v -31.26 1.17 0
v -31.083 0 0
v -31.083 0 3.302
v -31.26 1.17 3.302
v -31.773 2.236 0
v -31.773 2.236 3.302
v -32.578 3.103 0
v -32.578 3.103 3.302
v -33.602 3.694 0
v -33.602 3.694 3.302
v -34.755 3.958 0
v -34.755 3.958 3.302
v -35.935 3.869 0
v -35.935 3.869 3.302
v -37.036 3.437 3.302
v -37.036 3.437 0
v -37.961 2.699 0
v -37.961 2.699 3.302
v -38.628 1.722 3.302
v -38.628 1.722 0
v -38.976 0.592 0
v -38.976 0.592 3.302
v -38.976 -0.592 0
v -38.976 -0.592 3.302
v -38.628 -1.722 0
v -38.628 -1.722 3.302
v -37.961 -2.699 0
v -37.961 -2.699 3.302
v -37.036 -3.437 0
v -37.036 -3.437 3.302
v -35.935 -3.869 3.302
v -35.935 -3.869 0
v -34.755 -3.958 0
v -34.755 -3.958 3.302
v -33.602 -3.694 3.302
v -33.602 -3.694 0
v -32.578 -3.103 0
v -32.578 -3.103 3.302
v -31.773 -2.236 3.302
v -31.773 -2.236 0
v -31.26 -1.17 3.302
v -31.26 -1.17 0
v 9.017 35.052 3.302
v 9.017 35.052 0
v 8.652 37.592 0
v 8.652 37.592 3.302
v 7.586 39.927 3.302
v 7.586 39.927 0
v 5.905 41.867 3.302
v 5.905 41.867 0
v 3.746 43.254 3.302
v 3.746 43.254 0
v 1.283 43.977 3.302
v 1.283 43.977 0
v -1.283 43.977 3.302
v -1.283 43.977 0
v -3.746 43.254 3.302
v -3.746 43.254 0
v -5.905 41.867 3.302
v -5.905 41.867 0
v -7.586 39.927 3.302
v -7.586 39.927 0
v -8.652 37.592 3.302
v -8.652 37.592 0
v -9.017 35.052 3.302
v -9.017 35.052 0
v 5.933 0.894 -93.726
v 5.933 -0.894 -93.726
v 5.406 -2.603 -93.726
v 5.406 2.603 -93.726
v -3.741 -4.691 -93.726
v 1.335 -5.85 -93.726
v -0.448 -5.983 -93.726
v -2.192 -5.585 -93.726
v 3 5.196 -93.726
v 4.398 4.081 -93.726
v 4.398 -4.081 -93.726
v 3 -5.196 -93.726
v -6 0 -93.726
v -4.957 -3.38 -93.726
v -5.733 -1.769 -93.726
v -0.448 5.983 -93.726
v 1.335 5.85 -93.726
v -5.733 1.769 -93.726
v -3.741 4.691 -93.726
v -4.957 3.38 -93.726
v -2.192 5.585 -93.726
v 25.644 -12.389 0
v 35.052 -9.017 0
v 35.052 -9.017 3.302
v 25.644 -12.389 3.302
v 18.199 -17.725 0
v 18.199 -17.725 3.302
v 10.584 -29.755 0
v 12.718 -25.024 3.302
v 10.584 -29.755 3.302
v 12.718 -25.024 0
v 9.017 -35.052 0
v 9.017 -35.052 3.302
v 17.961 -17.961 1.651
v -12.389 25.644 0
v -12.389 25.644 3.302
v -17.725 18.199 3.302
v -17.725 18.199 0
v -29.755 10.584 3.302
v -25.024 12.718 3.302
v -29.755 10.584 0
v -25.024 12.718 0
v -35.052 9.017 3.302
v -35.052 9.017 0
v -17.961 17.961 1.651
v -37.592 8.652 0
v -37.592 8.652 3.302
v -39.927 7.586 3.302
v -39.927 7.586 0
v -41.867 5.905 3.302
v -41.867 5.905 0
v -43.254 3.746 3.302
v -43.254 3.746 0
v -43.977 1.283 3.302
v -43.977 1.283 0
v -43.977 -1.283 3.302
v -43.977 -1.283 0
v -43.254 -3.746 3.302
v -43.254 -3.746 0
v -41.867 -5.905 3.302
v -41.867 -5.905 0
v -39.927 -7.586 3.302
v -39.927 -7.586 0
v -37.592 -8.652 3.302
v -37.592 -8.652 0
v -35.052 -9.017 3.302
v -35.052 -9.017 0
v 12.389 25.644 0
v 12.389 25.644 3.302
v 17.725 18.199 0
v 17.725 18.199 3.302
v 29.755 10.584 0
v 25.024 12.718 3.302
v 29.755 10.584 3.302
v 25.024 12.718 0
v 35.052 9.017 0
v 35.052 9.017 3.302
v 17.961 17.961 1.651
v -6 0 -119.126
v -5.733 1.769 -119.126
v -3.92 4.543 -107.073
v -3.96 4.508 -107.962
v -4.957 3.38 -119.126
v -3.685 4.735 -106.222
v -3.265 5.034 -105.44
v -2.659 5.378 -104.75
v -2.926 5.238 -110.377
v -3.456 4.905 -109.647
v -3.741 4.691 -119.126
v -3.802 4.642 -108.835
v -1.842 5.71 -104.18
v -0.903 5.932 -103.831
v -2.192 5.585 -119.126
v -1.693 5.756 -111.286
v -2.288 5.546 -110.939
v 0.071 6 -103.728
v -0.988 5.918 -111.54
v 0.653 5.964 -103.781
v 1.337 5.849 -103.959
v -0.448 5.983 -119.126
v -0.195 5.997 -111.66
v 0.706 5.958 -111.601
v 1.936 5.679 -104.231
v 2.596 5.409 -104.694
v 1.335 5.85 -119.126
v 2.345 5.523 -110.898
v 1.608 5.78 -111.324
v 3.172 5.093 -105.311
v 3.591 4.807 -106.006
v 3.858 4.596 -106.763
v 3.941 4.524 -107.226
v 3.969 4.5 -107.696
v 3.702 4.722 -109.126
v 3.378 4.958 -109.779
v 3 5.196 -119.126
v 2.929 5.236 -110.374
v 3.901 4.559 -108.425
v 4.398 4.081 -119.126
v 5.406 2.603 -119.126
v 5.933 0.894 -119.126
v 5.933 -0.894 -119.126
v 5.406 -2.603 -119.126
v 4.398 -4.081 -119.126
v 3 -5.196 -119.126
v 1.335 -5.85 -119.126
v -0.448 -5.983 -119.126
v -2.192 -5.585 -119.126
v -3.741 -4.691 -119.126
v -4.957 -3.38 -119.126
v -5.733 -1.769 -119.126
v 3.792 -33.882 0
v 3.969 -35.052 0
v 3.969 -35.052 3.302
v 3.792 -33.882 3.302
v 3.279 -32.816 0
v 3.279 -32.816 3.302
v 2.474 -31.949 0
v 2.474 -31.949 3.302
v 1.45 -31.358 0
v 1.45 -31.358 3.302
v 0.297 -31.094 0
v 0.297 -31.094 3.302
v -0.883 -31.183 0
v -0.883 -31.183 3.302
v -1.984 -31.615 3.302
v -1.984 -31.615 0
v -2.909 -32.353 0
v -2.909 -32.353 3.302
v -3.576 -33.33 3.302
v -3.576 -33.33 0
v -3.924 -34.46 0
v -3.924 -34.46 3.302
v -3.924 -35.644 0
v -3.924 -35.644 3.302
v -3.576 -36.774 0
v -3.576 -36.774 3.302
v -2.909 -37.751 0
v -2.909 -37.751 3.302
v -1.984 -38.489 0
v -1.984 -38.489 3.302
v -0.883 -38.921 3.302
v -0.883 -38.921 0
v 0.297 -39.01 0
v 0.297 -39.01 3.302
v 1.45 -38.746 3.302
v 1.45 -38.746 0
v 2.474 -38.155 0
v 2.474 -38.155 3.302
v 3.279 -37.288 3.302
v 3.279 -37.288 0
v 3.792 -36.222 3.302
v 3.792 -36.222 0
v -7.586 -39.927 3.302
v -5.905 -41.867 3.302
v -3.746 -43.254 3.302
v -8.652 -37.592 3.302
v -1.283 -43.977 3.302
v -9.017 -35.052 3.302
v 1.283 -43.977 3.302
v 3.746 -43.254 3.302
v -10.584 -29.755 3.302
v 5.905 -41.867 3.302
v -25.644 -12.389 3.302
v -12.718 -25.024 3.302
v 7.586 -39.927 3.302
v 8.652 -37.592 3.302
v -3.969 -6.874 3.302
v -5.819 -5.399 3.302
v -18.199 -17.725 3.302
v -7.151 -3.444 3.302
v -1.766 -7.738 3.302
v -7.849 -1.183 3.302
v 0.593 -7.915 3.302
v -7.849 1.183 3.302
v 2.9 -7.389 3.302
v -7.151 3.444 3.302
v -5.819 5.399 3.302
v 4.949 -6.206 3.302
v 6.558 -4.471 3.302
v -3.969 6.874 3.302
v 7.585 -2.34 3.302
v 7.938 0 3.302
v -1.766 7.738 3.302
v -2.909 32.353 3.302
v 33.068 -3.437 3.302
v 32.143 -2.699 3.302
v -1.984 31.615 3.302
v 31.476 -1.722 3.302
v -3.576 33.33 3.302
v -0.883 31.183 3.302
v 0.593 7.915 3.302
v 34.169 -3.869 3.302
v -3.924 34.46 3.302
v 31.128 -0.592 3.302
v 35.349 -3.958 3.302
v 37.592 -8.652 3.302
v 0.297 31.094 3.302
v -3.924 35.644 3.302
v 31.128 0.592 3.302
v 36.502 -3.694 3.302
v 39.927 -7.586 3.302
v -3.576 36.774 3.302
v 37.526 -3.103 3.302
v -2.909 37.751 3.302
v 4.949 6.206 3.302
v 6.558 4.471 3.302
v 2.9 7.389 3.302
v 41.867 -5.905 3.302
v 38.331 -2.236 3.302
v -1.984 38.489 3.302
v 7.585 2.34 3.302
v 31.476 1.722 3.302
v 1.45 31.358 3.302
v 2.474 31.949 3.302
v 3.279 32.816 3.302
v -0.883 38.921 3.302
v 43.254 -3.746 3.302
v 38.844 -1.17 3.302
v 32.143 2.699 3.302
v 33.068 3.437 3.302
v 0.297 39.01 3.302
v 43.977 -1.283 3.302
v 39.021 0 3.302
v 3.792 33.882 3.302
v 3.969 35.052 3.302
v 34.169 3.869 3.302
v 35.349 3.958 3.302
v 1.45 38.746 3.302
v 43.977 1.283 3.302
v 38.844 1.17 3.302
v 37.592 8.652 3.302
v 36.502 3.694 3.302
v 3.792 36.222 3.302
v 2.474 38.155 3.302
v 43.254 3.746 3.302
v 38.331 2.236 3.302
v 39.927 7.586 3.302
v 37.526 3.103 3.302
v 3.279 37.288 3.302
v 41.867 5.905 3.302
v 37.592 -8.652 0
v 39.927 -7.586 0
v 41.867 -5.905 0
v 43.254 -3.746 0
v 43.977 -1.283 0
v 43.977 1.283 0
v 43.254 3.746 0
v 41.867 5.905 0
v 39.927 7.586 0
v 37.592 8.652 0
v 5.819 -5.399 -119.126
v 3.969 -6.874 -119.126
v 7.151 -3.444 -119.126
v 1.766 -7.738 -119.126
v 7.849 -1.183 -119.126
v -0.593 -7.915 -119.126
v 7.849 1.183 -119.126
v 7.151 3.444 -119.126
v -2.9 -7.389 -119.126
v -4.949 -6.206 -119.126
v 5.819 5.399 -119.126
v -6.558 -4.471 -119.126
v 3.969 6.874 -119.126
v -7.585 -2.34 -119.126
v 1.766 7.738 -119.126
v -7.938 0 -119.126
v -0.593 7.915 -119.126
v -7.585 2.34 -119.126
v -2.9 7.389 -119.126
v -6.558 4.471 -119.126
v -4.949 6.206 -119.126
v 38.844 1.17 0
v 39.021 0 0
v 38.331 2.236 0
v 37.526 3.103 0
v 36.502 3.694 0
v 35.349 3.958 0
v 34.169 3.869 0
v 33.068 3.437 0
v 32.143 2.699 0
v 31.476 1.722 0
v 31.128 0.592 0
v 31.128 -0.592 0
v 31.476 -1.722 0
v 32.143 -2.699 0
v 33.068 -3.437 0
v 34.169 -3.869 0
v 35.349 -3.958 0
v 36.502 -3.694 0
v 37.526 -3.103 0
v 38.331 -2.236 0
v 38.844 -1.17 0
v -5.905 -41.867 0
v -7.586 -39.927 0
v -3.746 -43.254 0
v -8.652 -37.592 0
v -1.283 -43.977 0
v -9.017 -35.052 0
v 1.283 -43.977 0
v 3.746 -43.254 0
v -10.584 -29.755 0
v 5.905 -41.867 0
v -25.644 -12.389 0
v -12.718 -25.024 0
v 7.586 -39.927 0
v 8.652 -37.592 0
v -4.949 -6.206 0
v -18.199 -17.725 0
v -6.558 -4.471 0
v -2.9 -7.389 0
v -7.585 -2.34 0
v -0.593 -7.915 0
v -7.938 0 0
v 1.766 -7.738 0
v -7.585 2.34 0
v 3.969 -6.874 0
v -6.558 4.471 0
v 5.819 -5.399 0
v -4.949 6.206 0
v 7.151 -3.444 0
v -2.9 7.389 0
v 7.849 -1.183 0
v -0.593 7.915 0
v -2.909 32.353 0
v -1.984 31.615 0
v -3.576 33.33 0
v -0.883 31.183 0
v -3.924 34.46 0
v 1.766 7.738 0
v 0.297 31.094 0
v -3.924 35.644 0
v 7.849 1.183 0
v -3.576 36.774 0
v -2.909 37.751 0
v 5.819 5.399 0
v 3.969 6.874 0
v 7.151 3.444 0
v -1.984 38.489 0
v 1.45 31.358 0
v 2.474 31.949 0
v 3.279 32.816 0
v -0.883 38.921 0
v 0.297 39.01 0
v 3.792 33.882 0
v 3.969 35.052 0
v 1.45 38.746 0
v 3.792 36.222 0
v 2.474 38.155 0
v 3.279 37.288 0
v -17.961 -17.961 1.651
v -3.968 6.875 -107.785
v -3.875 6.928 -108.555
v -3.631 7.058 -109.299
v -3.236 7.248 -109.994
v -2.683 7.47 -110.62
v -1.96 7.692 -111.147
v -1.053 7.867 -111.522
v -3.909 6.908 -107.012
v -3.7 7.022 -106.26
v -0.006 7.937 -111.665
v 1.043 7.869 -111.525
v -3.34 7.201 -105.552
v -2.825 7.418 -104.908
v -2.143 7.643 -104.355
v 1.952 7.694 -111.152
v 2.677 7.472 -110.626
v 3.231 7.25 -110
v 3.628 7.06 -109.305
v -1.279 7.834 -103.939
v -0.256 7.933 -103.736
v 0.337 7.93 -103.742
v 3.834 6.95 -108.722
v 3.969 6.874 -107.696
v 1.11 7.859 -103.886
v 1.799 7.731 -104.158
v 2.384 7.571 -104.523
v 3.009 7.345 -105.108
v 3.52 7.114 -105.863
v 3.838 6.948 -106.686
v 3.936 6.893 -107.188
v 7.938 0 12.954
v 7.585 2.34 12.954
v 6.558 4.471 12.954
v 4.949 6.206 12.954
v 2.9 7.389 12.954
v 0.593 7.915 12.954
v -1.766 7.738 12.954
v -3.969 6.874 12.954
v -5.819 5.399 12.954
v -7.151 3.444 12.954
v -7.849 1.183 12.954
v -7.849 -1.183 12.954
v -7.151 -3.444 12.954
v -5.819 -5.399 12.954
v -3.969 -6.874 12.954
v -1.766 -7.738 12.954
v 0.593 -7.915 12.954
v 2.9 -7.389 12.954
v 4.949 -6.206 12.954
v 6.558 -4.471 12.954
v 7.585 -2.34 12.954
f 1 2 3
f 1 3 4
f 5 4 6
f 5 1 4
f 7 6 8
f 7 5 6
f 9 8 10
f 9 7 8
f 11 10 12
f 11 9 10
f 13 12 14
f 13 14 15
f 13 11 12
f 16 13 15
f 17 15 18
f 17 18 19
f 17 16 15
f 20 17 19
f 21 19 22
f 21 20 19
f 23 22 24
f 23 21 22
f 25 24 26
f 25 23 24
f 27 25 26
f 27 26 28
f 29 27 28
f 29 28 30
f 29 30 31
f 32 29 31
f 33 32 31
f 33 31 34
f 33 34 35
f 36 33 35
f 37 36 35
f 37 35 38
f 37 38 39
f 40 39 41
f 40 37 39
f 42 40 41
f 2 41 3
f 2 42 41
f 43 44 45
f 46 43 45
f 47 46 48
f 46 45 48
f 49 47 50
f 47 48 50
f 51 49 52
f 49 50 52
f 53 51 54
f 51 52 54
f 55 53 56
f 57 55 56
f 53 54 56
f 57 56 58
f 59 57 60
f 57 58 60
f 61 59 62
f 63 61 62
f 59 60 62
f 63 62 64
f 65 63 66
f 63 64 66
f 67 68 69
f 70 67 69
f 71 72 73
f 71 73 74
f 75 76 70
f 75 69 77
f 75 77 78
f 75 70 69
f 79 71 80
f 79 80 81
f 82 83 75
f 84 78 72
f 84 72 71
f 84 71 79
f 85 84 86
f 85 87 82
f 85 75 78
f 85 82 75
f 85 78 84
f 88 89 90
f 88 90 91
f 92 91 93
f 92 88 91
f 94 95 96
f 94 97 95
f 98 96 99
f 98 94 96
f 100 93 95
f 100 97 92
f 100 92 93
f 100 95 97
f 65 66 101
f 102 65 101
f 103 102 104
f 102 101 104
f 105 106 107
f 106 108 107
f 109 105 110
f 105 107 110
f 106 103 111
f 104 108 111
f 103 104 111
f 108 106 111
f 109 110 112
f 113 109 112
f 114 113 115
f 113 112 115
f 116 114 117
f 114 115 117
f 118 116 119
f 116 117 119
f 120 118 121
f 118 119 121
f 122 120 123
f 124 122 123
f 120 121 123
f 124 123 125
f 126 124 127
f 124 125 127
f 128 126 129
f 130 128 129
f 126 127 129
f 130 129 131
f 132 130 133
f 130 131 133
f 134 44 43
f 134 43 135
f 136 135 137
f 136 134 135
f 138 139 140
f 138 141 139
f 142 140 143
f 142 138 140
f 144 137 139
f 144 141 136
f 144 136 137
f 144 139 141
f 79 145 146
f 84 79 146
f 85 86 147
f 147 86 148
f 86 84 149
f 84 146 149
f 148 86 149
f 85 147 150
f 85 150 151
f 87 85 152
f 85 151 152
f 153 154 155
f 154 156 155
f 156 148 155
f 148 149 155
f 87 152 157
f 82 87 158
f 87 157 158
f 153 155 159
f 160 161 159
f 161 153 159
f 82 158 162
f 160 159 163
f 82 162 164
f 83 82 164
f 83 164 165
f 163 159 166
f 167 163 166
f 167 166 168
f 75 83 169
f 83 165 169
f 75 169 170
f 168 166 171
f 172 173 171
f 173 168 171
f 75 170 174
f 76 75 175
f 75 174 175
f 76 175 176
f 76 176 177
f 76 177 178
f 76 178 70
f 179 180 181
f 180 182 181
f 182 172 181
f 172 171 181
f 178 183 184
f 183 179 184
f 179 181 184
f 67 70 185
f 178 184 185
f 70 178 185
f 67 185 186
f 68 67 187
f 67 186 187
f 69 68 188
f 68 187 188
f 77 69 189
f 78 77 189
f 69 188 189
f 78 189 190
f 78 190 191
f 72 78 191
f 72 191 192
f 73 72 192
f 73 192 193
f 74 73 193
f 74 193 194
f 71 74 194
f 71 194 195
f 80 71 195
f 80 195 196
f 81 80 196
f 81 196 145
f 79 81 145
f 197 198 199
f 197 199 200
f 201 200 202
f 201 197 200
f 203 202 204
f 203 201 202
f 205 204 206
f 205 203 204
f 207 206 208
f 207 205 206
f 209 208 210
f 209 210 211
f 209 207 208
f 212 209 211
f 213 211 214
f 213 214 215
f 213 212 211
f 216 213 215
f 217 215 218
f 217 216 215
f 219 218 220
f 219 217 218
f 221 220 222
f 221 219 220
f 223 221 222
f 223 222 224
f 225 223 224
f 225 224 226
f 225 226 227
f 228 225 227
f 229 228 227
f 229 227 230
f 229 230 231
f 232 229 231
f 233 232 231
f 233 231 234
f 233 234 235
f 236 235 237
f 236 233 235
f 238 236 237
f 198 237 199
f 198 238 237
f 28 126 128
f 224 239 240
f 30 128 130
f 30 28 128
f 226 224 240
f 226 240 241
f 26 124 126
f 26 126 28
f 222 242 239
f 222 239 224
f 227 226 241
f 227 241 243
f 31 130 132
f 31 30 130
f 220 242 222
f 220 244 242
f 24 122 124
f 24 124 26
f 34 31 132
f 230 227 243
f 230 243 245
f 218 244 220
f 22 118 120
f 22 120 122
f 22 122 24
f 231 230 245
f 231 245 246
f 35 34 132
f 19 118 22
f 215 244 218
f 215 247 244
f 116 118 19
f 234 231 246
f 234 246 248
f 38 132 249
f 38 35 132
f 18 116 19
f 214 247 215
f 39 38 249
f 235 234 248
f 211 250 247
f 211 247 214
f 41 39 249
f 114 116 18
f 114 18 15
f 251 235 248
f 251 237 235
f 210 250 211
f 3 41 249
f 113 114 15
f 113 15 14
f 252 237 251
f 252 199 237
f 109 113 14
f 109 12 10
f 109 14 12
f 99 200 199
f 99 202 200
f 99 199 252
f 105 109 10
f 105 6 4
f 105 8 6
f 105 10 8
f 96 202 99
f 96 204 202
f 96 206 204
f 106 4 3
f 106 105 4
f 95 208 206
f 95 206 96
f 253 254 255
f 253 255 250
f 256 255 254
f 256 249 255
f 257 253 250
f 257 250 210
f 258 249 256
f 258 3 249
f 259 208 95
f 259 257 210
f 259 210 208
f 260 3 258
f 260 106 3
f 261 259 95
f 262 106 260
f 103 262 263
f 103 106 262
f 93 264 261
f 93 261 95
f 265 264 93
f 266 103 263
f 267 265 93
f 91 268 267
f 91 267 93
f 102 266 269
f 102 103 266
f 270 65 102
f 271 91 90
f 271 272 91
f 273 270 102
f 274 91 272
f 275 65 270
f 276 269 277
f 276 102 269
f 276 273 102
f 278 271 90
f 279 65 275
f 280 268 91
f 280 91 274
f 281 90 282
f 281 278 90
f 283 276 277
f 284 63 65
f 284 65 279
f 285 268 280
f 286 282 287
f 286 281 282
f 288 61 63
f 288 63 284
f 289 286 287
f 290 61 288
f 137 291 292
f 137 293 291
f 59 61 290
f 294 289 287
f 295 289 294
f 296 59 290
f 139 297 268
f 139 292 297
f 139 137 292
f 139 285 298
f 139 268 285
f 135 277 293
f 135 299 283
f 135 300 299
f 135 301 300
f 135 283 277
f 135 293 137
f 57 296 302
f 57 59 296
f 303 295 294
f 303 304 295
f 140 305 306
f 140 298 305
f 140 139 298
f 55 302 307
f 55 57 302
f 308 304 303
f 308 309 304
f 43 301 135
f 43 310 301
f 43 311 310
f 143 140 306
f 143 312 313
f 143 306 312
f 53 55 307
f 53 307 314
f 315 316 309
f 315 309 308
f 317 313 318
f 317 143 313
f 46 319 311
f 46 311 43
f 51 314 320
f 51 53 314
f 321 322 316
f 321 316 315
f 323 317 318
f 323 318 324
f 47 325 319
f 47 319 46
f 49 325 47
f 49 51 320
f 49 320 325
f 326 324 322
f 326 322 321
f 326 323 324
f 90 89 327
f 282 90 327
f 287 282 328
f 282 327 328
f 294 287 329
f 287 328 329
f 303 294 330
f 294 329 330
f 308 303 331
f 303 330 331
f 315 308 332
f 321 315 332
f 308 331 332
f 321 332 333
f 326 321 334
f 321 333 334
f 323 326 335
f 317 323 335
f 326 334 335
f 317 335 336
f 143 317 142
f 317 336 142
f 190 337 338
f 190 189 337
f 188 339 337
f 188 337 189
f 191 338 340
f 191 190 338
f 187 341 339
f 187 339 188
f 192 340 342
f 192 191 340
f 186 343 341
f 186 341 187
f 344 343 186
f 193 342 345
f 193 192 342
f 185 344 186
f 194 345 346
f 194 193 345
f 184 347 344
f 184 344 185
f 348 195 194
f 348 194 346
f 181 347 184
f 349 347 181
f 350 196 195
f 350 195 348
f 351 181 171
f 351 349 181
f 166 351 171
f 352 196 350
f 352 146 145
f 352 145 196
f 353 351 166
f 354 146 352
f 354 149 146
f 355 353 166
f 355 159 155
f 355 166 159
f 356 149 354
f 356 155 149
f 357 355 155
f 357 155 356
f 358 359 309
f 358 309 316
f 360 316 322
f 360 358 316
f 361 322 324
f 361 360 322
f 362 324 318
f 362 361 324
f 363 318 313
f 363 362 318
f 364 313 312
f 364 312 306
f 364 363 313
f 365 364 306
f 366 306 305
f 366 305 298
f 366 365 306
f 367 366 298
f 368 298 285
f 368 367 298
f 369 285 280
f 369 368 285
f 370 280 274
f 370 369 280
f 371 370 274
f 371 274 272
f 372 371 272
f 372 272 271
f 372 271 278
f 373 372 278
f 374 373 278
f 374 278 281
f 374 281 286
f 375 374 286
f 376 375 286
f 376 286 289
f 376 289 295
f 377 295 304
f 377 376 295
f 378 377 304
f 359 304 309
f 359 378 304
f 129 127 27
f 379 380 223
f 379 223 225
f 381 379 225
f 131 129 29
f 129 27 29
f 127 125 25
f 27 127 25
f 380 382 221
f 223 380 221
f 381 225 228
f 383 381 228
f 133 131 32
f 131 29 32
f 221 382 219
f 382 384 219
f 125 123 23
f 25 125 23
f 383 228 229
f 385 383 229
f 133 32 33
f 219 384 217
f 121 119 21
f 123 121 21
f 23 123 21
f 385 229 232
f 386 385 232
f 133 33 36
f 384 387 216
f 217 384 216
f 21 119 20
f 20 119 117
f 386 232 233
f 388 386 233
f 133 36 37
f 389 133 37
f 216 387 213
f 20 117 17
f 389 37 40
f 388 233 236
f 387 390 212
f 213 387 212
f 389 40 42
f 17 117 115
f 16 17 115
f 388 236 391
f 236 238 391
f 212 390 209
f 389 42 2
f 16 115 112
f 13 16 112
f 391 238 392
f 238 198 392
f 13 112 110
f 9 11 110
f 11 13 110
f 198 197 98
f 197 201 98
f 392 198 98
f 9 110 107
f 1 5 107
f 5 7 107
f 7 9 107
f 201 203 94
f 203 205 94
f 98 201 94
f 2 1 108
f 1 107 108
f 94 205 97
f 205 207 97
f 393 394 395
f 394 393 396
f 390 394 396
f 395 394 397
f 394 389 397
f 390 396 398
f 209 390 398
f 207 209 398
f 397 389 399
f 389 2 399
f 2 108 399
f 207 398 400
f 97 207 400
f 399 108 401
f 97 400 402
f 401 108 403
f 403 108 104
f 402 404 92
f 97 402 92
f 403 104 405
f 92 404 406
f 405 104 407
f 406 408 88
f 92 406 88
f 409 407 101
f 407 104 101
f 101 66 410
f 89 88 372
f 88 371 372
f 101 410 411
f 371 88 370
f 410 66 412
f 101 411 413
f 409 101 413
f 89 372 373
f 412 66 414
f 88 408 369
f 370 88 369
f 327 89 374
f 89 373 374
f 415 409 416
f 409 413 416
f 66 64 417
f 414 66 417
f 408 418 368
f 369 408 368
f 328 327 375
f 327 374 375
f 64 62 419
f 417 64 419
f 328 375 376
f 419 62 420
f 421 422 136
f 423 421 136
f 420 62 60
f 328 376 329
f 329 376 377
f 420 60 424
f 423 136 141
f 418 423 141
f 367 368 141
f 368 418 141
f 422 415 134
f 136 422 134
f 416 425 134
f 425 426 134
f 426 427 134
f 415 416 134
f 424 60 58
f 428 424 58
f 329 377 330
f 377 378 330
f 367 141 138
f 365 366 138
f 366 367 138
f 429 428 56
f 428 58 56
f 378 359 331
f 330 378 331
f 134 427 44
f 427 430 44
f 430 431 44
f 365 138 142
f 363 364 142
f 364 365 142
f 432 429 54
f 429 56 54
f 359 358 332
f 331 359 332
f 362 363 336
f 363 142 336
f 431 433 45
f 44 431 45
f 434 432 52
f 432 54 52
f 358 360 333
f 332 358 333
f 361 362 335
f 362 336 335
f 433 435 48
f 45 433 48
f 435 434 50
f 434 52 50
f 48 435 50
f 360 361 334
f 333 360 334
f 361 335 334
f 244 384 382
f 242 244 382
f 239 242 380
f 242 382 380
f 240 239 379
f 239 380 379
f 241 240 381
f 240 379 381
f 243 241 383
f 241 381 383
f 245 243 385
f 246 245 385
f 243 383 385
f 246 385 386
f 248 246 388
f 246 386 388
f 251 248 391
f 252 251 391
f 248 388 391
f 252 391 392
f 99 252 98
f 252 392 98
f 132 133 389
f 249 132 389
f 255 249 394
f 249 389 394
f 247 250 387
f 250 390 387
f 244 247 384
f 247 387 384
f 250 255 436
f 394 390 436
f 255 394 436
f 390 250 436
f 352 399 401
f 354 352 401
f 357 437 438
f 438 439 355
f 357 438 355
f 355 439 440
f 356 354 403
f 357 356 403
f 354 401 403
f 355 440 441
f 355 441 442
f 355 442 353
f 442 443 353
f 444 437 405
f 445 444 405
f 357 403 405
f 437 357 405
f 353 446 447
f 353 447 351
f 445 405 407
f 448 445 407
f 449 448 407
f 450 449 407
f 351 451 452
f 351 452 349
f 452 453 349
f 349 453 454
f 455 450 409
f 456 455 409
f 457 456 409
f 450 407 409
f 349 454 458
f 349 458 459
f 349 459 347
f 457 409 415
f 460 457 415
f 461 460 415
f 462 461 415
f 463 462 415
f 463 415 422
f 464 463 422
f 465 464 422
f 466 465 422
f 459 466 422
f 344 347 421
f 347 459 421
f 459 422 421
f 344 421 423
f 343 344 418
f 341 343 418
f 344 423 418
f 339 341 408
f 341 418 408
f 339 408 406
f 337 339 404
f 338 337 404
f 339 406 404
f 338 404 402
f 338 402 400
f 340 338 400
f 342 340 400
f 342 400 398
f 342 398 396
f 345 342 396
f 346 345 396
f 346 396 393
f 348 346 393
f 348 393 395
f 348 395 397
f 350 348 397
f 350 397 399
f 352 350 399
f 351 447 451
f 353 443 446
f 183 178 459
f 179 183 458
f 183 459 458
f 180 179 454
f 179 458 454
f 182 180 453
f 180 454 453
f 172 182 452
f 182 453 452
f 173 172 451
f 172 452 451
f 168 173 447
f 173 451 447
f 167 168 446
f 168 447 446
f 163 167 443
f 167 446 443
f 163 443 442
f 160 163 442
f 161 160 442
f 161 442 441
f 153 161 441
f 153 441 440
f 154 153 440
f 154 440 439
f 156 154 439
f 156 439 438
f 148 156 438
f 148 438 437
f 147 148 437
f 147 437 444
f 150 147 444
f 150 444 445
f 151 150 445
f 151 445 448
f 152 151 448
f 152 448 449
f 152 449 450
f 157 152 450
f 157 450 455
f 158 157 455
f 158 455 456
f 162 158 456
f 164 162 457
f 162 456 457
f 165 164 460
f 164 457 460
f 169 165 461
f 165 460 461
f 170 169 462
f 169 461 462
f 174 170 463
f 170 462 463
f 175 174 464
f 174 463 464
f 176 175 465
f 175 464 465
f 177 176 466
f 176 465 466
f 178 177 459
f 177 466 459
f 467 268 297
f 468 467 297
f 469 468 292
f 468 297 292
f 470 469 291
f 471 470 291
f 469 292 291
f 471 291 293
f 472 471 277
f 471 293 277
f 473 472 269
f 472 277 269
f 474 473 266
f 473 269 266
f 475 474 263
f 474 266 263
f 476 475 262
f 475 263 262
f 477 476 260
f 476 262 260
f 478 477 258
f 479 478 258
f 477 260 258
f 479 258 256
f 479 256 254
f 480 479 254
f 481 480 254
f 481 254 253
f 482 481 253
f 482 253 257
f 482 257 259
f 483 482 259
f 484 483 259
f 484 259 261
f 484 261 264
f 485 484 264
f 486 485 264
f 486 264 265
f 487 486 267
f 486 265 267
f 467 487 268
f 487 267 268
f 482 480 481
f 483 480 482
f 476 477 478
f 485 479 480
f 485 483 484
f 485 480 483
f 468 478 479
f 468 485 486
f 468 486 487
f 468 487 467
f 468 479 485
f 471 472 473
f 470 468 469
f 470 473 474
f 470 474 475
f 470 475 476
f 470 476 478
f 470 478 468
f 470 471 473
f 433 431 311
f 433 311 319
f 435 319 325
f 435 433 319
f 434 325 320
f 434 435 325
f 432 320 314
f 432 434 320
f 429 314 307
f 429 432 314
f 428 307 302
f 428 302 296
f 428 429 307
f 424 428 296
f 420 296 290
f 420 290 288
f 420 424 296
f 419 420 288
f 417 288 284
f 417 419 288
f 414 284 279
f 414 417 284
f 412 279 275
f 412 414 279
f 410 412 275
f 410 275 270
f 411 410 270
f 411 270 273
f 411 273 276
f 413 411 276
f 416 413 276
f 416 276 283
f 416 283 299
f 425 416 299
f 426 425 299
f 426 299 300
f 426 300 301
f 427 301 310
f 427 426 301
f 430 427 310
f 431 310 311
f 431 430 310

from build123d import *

# Parameters (mm, degrees)
SKETCH1_R           = 3.96875
BOSS_EXTRUDE1_DEPTH = 3.302
SKETCH2_R           = 7.9375
BOSS_EXTRUDE2_DEPTH = 9.652
SKETCH3_R           = 7.9375
BOSS_EXTRUDE3_DEPTH = 119.126
SKETCH4_R           = 6
CUT_EXTRUDE1_DEPTH  = 25.4
CUT_EXTRUDE2_REACH  = 56.229
SKETCH5_R           = 3.96875


with BuildPart() as part:
    # Sketch1 → Boss-Extrude1 (new body)
    with BuildSketch(Plane.XY):
        with BuildLine():
            ThreePointArc((9.017, 35.052), (0, 44.069), (-9.017, 35.052))
            add(Edge.make_bspline(
                [(-9.017, 35.052), (-13.886524484, 13.886524484), (-35.052, 9.017)],
                knots=[0, 0, 0, 1, 1, 1], degree=2))
            ThreePointArc((-35.052, 9.017), (-44.069, 0), (-35.052, -9.017))
            add(Edge.make_bspline(
                [(-35.052, -9.017), (-13.886524484, -13.886524484), (-9.017, -35.052)],
                knots=[0, 0, 0, 1, 1, 1], degree=2))
            ThreePointArc((-9.017, -35.052), (0, -44.069), (9.017, -35.052))
            add(Edge.make_bspline(
                [(35.052, -9.017), (13.886524484, -13.886524484), (9.017, -35.052)],
                knots=[0, 0, 0, 1, 1, 1], degree=2))
            ThreePointArc((35.052, -9.017), (44.069, 0), (35.052, 9.017))
            add(Edge.make_bspline(
                [(9.017, 35.052), (13.886524484, 13.886524484), (35.052, 9.017)],
                knots=[0, 0, 0, 1, 1, 1], degree=2))
        make_face()
        with Locations((0, 35.052)):
            Circle(SKETCH1_R, mode=Mode.SUBTRACT)
        with Locations((35.052, 0)):
            Circle(SKETCH1_R, mode=Mode.SUBTRACT)
        with Locations((0, -35.052)):
            Circle(SKETCH1_R, mode=Mode.SUBTRACT)
        with Locations((-35.052, 0)):
            Circle(SKETCH1_R, mode=Mode.SUBTRACT)
    extrude(amount=BOSS_EXTRUDE1_DEPTH)

    # Sketch2 → Boss-Extrude2 (add)
    with BuildSketch(Plane.XY.offset(3.302)):
        Circle(SKETCH2_R)
    extrude(amount=BOSS_EXTRUDE2_DEPTH)

    # Sketch3 → Boss-Extrude3 (add)
    with BuildSketch(Plane(origin=(0, 0, 0), x_dir=(-1, 0, 0), z_dir=(0, 0, -1))):
        Circle(SKETCH3_R)
    extrude(amount=BOSS_EXTRUDE3_DEPTH)

    # Sketch4 → Cut-Extrude1 (cut)
    with BuildSketch(Plane(origin=(0, 0, -119.126), x_dir=(-1, 0, 0), z_dir=(0, 0, -1))):
        Circle(SKETCH4_R)
    extrude(amount=-CUT_EXTRUDE1_DEPTH, mode=Mode.SUBTRACT)

    # Sketch5 → Cut-Extrude2 (cut, up to next)
    with BuildSketch(Plane(origin=(0, 10.16, 0), x_dir=(1, 0, 0), z_dir=(0, 1, 0)), mode=Mode.PRIVATE) as cut_extrude2_sk1:
        with Locations((0, 107.696)):
            Circle(SKETCH5_R)
    cut_extrude2_tool1 = extrude(cut_extrude2_sk1.sketch, amount=-CUT_EXTRUDE2_REACH, mode=Mode.PRIVATE) & part.part
    add(cut_extrude2_tool1.solids().sort_by_distance((0, 10.16, -107.696))[0], mode=Mode.SUBTRACT)


solid = part.part
